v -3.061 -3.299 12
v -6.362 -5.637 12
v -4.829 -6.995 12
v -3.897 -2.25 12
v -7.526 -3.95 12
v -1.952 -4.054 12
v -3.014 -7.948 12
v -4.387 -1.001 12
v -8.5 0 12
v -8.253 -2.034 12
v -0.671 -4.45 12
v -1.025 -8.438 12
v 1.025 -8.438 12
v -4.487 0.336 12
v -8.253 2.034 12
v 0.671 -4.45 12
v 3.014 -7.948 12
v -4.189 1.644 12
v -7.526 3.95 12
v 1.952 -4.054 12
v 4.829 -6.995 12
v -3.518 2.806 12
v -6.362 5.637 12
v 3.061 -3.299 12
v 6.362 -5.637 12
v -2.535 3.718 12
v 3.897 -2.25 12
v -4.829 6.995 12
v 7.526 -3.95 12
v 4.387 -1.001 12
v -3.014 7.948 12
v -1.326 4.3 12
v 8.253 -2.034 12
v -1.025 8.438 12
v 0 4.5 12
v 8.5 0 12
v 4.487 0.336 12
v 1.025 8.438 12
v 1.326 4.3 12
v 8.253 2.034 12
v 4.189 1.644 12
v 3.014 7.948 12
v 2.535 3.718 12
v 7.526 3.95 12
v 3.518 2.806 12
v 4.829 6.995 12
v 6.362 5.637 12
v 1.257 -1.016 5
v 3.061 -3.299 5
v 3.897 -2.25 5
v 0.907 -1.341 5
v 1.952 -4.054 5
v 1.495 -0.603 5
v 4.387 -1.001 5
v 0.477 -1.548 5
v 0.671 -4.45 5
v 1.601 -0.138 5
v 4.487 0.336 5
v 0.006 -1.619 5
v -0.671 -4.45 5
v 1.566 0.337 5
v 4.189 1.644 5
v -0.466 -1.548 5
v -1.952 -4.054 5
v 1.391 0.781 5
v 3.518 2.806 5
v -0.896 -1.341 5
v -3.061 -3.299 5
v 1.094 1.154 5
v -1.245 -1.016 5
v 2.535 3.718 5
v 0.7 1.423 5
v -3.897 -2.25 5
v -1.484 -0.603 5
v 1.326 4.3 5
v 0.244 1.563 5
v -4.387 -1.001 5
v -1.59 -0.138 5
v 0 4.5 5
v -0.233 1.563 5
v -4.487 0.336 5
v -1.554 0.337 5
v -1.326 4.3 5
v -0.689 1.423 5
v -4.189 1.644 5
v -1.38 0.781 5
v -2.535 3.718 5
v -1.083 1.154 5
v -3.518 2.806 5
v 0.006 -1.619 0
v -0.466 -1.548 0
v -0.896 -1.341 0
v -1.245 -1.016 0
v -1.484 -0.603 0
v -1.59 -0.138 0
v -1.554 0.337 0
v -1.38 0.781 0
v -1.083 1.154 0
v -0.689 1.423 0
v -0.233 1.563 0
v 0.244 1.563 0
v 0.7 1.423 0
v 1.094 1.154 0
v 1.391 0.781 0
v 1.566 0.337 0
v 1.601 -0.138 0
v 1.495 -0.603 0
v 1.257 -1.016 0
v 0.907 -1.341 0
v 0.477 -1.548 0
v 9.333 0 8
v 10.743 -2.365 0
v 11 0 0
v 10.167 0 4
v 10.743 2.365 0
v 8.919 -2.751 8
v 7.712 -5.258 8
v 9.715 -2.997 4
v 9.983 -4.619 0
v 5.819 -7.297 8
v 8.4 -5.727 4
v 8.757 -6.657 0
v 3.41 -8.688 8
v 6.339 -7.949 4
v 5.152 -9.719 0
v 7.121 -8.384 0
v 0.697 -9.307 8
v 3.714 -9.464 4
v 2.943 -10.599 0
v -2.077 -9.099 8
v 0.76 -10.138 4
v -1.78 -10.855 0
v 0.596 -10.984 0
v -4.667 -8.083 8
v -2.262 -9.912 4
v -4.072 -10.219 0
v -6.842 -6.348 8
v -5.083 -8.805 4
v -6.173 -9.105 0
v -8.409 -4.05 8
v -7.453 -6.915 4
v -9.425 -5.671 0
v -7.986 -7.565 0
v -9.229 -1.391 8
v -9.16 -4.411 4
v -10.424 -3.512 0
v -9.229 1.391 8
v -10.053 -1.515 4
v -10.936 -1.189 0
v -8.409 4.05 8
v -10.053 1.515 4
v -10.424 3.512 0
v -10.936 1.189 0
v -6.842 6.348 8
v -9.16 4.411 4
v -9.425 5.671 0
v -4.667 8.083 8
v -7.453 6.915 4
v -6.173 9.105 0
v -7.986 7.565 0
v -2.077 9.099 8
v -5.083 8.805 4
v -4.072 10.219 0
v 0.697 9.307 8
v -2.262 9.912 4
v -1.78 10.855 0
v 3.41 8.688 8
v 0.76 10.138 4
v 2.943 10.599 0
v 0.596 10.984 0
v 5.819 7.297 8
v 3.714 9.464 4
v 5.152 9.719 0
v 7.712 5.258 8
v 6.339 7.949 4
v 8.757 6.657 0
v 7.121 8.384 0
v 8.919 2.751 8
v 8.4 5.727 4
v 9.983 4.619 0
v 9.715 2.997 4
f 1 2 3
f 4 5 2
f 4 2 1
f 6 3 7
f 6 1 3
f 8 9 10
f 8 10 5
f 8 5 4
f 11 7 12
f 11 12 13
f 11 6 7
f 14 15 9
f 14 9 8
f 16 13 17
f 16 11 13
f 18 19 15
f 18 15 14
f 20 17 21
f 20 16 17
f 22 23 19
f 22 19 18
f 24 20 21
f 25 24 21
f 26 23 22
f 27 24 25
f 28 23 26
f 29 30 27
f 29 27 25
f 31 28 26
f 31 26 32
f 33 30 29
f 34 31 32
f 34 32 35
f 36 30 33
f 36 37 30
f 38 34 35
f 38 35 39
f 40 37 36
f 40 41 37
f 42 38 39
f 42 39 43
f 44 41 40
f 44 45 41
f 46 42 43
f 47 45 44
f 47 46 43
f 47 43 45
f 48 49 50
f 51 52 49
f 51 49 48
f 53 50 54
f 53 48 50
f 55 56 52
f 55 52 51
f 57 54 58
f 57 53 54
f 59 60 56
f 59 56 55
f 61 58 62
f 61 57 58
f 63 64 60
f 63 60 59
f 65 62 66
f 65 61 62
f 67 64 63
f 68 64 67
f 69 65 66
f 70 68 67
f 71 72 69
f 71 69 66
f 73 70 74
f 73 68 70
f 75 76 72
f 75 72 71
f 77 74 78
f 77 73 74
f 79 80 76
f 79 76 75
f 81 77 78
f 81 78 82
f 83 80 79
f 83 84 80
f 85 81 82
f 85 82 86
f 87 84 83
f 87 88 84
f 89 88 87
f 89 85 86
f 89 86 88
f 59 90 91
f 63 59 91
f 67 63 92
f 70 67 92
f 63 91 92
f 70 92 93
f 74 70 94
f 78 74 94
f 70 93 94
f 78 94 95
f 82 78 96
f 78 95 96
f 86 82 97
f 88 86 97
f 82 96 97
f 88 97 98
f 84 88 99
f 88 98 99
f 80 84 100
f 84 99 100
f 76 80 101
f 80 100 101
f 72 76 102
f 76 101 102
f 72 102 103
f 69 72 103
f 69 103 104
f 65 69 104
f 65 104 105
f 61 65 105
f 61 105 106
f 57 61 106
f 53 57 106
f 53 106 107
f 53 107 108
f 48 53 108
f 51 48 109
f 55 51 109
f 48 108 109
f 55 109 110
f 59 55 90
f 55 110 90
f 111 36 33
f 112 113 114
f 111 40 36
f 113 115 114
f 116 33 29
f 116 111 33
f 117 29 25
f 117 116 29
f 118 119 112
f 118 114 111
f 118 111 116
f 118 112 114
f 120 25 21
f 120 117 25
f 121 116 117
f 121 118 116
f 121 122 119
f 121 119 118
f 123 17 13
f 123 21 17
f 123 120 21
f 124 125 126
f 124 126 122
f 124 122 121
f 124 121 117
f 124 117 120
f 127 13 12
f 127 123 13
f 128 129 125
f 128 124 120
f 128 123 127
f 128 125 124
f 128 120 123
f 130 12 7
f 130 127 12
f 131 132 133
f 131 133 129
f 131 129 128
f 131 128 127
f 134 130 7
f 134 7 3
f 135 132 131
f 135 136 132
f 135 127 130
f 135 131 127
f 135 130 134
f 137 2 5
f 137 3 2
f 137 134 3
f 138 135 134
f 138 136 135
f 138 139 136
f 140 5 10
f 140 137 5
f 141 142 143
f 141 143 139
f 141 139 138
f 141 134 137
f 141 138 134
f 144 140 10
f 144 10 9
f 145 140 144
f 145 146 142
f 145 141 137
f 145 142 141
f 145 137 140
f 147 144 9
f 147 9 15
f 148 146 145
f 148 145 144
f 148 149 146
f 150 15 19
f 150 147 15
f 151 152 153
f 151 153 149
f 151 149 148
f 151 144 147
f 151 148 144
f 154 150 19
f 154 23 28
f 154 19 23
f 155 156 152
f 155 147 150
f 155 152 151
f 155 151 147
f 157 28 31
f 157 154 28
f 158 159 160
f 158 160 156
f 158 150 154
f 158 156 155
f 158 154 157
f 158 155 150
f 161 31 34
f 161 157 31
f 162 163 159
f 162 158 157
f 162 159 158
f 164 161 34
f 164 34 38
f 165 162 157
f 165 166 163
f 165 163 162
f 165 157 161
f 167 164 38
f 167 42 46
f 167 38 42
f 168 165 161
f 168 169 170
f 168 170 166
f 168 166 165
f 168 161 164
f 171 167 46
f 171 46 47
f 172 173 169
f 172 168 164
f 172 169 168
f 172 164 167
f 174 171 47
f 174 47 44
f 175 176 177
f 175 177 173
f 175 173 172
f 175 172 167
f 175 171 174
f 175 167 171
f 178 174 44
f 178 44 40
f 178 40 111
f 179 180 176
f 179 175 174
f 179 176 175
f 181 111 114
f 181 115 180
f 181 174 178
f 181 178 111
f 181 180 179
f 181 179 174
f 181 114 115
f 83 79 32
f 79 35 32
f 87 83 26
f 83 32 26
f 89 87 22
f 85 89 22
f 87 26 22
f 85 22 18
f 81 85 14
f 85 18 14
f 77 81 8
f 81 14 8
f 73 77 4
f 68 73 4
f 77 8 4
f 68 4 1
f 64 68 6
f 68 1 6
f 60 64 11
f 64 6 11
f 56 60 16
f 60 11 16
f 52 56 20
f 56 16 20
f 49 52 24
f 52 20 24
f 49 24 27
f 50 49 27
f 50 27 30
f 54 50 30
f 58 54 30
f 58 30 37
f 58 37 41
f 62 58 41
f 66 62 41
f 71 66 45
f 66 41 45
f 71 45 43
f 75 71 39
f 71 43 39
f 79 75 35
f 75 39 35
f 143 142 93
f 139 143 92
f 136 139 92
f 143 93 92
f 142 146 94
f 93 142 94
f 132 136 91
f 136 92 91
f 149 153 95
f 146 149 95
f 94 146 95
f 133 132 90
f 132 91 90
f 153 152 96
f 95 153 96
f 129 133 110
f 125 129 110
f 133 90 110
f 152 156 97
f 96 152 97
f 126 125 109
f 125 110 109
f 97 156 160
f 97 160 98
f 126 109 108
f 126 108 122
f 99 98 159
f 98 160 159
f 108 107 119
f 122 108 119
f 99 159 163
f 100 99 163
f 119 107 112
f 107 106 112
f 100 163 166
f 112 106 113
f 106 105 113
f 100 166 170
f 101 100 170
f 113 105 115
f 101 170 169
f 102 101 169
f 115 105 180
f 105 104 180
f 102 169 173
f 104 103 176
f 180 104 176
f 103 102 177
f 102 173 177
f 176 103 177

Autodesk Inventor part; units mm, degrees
ref_plane "YZ Plane" through (0, 0, 0) normal (1, 0, 0) x (0, 1, 0)
ref_plane "XZ Plane" through (0, 0, 0) normal (0, 1, 0) x (-1, 0, 0)
sketch "Boceto1" plane through (0, 0, 0) normal (0, 0, 1) x (1, 0, 0)
  circle A0 centre (0, 0) radius 11
  dimension "d0" = 22
ref_plane "Plano de trabajo3" through (0, 0, 5) normal (0, 0, 1) x (1, 0, 0)
sketch "Boceto3" plane through (0, 0, 5) normal (0, 0, 1) x (1, 0, 0)
  circle A0 centre (0, 0) radius 4.5
  circle A1 centre (0, 0) radius 1.5
  dimension "d5" = 9
  dimension "d6" = 3
ref_plane "Plano de trabajo4" through (0, 0, 12) normal (0, 0, 1) x (1, 0, 0)
sketch "Boceto4" plane through (0, 0, 12) normal (0, 0, 1) x (1, 0, 0)
  circle A0 centre (0, 0) radius 8.5
  dimension "d8" = 17
loft "Solevación1" add profiles "Boceto1", "Boceto4"
hole "Agujero3" at (0, 0, 5) direction (0, 0, 1) diameter 9 depth 7
sketch "Boceto5" plane through (0, 0, 5) normal (0, 0, 1) x (1, 0, 0)
  point P0 (0, 0)
  point P1 (0.0057, -0.0188)
hole "Agujero4" at (0.0057, -0.0188, 5) direction (0, 0, -1) diameter 3.2 end through all
properties part number "Patas"
